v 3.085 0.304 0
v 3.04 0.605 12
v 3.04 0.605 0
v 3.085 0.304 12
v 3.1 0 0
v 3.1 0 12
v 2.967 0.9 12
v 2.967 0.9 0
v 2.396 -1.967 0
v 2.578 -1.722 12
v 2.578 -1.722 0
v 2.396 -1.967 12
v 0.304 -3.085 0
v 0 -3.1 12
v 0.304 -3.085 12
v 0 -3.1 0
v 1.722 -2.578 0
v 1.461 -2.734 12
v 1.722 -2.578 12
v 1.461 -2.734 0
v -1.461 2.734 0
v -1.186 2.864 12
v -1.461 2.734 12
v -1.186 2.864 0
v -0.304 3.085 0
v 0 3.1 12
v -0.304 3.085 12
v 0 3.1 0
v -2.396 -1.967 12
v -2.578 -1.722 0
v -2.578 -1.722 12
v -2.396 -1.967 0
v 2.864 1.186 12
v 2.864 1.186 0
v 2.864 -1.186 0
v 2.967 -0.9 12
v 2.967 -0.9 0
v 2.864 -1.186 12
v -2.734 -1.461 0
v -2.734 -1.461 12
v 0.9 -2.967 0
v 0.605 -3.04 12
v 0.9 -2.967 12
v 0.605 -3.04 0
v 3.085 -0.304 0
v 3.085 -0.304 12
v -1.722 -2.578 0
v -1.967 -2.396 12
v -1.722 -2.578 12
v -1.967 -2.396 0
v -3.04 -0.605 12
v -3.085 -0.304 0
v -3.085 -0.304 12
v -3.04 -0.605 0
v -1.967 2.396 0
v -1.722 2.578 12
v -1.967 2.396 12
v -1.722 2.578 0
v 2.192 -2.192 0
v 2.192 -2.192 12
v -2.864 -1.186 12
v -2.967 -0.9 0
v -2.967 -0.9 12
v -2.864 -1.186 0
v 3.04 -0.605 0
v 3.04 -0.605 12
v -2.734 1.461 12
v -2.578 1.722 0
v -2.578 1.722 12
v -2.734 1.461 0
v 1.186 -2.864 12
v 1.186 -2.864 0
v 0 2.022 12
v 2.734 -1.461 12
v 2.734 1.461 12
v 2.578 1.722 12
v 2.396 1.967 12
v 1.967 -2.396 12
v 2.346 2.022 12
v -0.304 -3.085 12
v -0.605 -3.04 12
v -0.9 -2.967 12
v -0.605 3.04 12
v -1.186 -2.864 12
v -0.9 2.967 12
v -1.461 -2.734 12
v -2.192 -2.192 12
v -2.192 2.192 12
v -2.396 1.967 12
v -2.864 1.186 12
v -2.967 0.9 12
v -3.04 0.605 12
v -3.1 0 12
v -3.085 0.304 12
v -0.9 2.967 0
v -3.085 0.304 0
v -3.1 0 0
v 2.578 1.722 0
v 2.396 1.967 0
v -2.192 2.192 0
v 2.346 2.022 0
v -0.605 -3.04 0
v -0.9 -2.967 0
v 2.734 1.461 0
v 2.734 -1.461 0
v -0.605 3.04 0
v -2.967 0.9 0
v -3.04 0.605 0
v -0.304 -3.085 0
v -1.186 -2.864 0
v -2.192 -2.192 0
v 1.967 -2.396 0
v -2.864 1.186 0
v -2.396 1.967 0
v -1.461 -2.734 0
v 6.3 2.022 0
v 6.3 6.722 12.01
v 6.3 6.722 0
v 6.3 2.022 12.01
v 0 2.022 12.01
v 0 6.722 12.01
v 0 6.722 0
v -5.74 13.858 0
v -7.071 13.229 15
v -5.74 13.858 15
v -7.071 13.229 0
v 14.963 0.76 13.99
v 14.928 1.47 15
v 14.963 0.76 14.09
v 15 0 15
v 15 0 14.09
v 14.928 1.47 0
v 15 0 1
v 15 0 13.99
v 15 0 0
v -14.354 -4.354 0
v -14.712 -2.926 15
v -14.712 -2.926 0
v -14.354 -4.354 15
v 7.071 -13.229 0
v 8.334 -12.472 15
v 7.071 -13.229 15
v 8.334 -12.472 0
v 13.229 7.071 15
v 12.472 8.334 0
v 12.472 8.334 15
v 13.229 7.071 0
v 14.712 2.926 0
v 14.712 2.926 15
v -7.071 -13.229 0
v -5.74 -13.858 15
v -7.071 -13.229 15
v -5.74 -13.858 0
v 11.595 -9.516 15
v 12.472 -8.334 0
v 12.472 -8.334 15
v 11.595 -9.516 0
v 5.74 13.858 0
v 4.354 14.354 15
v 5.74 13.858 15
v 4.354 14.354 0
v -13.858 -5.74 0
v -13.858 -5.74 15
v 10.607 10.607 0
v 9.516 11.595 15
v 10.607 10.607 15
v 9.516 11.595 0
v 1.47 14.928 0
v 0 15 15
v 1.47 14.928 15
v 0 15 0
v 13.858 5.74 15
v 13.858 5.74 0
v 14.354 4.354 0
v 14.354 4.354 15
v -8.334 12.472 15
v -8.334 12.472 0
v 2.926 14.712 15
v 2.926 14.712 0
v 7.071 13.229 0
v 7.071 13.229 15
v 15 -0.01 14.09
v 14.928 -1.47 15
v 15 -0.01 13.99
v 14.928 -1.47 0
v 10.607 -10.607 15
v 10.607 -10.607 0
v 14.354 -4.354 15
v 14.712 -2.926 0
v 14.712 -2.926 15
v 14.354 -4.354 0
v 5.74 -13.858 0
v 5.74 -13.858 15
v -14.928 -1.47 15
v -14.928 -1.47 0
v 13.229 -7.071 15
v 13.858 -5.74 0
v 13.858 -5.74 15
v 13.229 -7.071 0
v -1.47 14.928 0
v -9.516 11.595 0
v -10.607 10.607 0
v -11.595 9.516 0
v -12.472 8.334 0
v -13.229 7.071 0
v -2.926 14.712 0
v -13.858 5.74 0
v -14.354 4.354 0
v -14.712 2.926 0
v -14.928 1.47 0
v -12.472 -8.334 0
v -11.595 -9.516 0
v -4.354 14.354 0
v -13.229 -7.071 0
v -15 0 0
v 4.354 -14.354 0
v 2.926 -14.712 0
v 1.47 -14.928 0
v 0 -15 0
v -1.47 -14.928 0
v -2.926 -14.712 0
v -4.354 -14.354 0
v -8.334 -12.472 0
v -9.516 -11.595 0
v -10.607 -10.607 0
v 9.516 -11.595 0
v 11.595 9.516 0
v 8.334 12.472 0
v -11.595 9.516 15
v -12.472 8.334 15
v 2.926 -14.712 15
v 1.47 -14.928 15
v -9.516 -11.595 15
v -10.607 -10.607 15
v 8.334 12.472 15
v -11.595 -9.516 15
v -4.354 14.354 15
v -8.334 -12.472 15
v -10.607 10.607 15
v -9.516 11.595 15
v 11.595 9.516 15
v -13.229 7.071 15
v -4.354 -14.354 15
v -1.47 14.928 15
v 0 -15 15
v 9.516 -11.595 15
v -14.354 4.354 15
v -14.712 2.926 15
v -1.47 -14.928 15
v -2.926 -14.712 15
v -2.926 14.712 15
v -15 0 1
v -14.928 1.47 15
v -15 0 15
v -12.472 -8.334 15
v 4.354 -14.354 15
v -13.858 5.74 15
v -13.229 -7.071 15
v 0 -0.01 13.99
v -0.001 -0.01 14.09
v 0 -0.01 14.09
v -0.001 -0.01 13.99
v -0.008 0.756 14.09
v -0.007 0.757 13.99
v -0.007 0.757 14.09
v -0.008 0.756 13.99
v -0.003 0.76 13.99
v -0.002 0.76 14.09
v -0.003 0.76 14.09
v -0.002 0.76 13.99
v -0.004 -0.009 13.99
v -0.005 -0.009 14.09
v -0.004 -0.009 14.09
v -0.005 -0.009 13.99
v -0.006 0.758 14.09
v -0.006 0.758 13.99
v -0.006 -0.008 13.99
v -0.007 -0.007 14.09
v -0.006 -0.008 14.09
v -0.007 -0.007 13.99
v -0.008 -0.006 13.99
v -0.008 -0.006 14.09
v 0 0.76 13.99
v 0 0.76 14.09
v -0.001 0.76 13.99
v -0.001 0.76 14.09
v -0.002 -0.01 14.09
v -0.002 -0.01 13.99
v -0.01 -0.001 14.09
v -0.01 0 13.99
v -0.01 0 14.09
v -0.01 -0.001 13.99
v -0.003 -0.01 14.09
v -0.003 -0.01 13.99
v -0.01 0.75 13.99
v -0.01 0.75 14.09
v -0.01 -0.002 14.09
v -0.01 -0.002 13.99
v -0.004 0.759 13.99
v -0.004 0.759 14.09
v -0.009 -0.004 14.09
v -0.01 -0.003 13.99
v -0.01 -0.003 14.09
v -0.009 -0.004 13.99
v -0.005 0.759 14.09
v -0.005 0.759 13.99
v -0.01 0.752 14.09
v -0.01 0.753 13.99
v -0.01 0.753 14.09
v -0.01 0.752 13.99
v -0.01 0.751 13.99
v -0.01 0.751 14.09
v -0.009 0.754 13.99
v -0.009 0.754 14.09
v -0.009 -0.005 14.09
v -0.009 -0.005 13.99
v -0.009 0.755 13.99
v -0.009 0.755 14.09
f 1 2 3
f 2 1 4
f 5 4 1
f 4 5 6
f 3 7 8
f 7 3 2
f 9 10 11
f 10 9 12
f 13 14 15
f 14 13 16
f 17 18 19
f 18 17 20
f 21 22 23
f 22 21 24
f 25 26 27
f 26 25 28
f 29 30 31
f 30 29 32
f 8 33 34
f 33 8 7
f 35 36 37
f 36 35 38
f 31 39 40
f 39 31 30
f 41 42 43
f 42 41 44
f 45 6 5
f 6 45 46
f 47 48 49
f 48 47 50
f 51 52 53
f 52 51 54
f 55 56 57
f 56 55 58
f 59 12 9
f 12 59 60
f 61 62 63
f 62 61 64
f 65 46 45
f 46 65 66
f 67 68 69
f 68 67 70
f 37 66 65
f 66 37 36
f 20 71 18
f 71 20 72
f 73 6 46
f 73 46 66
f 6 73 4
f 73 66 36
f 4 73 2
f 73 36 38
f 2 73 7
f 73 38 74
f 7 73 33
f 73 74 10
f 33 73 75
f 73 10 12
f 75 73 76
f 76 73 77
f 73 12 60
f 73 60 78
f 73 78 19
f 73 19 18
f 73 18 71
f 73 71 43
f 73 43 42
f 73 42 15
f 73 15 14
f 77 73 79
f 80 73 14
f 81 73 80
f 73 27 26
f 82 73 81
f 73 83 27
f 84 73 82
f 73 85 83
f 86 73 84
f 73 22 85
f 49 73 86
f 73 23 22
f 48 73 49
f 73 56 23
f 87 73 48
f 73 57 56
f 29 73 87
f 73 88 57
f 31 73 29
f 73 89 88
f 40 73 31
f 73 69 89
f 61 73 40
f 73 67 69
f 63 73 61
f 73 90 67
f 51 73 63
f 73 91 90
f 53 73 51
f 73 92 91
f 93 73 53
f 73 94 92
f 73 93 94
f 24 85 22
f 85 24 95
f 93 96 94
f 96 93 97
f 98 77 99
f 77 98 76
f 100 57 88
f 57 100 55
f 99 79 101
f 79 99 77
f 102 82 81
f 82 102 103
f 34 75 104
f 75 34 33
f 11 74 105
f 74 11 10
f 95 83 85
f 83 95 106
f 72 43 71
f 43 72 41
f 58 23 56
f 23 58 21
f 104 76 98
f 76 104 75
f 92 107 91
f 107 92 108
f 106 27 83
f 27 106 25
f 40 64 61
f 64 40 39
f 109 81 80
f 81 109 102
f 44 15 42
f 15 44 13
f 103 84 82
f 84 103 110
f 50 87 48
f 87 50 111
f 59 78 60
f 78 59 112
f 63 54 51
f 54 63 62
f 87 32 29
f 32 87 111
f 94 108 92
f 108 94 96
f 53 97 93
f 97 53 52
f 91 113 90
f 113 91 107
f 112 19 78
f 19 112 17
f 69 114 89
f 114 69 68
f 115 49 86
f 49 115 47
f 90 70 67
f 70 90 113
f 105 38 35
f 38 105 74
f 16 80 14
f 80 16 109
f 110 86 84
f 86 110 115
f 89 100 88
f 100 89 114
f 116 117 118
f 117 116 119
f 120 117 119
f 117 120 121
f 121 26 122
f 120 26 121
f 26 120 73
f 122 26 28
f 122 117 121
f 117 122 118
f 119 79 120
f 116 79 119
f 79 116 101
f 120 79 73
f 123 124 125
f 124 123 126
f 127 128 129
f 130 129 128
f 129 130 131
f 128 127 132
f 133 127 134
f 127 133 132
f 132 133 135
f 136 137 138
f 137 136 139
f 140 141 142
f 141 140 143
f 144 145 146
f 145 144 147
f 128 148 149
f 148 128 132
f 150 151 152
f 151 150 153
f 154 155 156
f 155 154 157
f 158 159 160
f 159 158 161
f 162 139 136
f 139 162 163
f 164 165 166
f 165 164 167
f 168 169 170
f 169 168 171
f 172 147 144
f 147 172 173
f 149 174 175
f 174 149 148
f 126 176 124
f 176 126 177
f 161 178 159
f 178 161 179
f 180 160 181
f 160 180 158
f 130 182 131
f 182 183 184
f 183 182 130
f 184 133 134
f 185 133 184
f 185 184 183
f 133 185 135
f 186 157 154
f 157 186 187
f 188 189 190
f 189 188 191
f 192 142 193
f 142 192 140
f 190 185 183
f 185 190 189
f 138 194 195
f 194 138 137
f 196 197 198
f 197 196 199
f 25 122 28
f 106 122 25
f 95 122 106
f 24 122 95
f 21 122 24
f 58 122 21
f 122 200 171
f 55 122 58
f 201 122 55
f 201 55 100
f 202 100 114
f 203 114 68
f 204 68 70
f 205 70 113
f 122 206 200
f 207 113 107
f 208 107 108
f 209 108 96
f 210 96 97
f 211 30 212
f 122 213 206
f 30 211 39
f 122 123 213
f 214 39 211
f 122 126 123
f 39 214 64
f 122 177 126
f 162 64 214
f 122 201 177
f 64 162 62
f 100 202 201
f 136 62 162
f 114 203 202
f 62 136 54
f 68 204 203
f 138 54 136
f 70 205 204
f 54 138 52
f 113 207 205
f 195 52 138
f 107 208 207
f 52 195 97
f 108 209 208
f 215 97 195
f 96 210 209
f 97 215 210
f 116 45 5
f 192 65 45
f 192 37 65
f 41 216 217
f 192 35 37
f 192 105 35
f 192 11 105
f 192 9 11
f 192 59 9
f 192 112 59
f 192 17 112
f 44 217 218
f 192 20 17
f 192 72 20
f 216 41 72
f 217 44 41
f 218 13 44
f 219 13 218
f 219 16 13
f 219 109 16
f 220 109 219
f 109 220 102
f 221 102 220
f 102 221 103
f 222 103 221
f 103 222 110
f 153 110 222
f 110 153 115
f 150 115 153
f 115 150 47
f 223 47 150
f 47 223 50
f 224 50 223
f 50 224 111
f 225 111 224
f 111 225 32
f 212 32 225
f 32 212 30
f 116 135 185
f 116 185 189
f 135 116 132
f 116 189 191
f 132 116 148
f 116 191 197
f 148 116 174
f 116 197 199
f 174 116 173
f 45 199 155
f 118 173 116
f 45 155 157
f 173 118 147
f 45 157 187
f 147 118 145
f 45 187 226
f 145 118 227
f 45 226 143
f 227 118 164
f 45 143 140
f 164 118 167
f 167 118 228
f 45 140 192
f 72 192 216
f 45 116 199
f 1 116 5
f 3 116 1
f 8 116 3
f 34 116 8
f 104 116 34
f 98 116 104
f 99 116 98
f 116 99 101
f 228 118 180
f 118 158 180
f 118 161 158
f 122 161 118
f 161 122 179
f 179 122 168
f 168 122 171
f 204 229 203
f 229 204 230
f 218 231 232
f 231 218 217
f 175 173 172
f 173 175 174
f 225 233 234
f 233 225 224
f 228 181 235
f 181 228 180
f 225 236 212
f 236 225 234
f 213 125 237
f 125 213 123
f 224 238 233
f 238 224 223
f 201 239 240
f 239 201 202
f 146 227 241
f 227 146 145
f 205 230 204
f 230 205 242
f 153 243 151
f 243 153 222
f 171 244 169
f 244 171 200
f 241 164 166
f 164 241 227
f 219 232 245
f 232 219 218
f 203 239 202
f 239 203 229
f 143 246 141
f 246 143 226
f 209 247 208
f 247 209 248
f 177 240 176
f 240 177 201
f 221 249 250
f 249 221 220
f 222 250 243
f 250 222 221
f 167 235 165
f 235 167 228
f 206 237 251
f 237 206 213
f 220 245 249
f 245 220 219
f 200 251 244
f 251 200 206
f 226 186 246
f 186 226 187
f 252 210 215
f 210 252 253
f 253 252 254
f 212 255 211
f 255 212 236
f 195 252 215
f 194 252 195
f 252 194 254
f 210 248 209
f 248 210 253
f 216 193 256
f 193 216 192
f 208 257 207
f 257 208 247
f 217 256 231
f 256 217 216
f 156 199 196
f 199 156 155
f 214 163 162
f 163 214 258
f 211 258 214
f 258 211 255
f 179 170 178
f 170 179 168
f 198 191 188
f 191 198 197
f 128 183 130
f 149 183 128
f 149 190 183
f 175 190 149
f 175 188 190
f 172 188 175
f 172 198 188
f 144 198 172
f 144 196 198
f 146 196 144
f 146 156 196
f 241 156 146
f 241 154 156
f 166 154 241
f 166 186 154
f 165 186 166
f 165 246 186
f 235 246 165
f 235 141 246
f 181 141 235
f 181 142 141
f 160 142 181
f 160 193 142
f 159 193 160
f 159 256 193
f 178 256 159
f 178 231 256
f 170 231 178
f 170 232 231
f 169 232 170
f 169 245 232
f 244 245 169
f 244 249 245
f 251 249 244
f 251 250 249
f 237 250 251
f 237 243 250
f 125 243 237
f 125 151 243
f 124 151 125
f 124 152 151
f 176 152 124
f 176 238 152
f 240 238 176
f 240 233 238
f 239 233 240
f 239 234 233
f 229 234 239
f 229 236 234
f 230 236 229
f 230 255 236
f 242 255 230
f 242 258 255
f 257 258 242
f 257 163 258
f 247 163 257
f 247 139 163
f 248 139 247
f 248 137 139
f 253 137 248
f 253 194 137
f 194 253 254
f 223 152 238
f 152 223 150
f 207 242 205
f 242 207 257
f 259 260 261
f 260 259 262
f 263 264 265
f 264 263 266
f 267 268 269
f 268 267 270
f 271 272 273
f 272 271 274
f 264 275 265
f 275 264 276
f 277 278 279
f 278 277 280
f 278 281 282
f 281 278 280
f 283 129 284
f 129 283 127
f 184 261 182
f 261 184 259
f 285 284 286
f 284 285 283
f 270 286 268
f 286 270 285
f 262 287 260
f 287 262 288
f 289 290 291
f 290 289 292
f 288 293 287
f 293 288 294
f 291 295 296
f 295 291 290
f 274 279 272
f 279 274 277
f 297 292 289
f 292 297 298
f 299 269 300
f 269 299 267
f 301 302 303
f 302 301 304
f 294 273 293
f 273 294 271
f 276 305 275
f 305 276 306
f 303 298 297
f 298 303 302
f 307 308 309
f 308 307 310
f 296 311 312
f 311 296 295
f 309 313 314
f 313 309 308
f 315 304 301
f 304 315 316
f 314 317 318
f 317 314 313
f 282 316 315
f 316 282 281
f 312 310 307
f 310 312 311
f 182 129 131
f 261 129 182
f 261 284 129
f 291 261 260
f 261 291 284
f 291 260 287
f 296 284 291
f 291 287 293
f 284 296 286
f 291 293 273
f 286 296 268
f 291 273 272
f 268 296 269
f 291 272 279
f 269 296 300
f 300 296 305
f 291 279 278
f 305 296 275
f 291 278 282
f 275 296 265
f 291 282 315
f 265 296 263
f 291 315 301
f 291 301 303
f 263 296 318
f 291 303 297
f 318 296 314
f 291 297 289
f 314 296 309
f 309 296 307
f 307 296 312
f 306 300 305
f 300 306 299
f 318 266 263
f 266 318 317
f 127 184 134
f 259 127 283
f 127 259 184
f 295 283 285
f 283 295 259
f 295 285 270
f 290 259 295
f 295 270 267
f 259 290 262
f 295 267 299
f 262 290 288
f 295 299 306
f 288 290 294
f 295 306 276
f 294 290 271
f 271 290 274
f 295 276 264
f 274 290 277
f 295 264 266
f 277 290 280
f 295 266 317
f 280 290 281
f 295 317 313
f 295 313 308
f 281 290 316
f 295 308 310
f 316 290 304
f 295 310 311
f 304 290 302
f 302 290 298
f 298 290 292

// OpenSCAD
// Replacement knob for hotplate stirrer with 6 mm D-shaft
// Dimensions from user specification

$fn = 64;

// Main knob dimensions
knob_diameter = 30;
knob_height = 15;

// D-shaft bore dimensions
d_shaft_flat_to_opposite = 4.7;
d_shaft_radius = 6.2 / 2;
d_shaft_depth = 12;

// Grip groove dimensions
groove_diameter = 2;
num_grooves = 18;

// Pointer groove dimensions
pointer_width = 1.5;
pointer_depth = 1;

// Calculate D-shaft cut height (chord height)
// Given chord height h = 4.7 mm and circle radius r = 3.1 mm
// The chord is at distance d from center: d = sqrt(r^2 - (chord/2)^2)
chord_height = d_shaft_flat_to_opposite;
chord_half = chord_height / 2;
d_from_center = sqrt(d_shaft_radius * d_shaft_radius - chord_half * chord_half);

// Build the knob
module knob() {
    // Main cylinder
    cylinder(h = knob_height, r = knob_diameter / 2, center = false);
}

module d_shaft_bore() {
    // D-shaped bore: cylinder with one side cut flat
    // First create the full cylinder for the bore
    translate([0, 0, -0.01]) {
        cylinder(h = d_shaft_depth + 0.01, r = d_shaft_radius, center = false);
    }
    
    // Cut the flat side: subtract a rectangular prism
    // The flat is at distance d_from_center from center, and chord height is 4.7 mm
    // Position the cut so the flat is at the front (positive Y side)
    translate([0, d_from_center, -0.01]) {
        cube([d_shaft_radius * 2 + 0.1, chord_height, d_shaft_depth + 0.02], center = false);
    }
}

module grip_grooves() {
    radius = knob_diameter / 2;
    for (i = [0 : num_grooves - 1]) {
        angle = (i * 360) / num_grooves;
        translate([0, 0, 0]) {
            rotate([0, 0, angle]) {
                translate([radius, 0, 0]) {
                    rotate([0, 90, 0]) {
                        cylinder(h = knob_height + 0.1, r = groove_diameter / 2, center = false);
                    }
                }
            }
        }
    }
}

module pointer_groove() {
    // Pointer groove runs from center to outer edge on the same side as the D-shaft flat (positive Y side)
    // Width = 1.5 mm, depth = 1 mm
    // Create a triangular wedge shape
    translate([0, 0, knob_height - pointer_depth - 0.01]) {
        hull() {
            // Center point
            translate([0, 0, 0]) {
                cylinder(h = 0.1, r = 0.01, center = false);
            }
            // Outer edge point (at knob radius)
            translate([knob_diameter / 2, 0, 0]) {
                cylinder(h = 0.1, r = 0.01, center = false);
            }
            // Add width by extending in Y direction
            translate([0, pointer_width / 2, 0]) {
                cylinder(h = 0.1, r = 0.01, center = false);
            }
            translate([knob_diameter / 2, pointer_width / 2, 0]) {
                cylinder(h = 0.1, r = 0.01, center = false);
            }
        }
    }
}

// Build the final part
difference() {
    knob();
    d_shaft_bore();
    grip_grooves();
    pointer_groove();
}
